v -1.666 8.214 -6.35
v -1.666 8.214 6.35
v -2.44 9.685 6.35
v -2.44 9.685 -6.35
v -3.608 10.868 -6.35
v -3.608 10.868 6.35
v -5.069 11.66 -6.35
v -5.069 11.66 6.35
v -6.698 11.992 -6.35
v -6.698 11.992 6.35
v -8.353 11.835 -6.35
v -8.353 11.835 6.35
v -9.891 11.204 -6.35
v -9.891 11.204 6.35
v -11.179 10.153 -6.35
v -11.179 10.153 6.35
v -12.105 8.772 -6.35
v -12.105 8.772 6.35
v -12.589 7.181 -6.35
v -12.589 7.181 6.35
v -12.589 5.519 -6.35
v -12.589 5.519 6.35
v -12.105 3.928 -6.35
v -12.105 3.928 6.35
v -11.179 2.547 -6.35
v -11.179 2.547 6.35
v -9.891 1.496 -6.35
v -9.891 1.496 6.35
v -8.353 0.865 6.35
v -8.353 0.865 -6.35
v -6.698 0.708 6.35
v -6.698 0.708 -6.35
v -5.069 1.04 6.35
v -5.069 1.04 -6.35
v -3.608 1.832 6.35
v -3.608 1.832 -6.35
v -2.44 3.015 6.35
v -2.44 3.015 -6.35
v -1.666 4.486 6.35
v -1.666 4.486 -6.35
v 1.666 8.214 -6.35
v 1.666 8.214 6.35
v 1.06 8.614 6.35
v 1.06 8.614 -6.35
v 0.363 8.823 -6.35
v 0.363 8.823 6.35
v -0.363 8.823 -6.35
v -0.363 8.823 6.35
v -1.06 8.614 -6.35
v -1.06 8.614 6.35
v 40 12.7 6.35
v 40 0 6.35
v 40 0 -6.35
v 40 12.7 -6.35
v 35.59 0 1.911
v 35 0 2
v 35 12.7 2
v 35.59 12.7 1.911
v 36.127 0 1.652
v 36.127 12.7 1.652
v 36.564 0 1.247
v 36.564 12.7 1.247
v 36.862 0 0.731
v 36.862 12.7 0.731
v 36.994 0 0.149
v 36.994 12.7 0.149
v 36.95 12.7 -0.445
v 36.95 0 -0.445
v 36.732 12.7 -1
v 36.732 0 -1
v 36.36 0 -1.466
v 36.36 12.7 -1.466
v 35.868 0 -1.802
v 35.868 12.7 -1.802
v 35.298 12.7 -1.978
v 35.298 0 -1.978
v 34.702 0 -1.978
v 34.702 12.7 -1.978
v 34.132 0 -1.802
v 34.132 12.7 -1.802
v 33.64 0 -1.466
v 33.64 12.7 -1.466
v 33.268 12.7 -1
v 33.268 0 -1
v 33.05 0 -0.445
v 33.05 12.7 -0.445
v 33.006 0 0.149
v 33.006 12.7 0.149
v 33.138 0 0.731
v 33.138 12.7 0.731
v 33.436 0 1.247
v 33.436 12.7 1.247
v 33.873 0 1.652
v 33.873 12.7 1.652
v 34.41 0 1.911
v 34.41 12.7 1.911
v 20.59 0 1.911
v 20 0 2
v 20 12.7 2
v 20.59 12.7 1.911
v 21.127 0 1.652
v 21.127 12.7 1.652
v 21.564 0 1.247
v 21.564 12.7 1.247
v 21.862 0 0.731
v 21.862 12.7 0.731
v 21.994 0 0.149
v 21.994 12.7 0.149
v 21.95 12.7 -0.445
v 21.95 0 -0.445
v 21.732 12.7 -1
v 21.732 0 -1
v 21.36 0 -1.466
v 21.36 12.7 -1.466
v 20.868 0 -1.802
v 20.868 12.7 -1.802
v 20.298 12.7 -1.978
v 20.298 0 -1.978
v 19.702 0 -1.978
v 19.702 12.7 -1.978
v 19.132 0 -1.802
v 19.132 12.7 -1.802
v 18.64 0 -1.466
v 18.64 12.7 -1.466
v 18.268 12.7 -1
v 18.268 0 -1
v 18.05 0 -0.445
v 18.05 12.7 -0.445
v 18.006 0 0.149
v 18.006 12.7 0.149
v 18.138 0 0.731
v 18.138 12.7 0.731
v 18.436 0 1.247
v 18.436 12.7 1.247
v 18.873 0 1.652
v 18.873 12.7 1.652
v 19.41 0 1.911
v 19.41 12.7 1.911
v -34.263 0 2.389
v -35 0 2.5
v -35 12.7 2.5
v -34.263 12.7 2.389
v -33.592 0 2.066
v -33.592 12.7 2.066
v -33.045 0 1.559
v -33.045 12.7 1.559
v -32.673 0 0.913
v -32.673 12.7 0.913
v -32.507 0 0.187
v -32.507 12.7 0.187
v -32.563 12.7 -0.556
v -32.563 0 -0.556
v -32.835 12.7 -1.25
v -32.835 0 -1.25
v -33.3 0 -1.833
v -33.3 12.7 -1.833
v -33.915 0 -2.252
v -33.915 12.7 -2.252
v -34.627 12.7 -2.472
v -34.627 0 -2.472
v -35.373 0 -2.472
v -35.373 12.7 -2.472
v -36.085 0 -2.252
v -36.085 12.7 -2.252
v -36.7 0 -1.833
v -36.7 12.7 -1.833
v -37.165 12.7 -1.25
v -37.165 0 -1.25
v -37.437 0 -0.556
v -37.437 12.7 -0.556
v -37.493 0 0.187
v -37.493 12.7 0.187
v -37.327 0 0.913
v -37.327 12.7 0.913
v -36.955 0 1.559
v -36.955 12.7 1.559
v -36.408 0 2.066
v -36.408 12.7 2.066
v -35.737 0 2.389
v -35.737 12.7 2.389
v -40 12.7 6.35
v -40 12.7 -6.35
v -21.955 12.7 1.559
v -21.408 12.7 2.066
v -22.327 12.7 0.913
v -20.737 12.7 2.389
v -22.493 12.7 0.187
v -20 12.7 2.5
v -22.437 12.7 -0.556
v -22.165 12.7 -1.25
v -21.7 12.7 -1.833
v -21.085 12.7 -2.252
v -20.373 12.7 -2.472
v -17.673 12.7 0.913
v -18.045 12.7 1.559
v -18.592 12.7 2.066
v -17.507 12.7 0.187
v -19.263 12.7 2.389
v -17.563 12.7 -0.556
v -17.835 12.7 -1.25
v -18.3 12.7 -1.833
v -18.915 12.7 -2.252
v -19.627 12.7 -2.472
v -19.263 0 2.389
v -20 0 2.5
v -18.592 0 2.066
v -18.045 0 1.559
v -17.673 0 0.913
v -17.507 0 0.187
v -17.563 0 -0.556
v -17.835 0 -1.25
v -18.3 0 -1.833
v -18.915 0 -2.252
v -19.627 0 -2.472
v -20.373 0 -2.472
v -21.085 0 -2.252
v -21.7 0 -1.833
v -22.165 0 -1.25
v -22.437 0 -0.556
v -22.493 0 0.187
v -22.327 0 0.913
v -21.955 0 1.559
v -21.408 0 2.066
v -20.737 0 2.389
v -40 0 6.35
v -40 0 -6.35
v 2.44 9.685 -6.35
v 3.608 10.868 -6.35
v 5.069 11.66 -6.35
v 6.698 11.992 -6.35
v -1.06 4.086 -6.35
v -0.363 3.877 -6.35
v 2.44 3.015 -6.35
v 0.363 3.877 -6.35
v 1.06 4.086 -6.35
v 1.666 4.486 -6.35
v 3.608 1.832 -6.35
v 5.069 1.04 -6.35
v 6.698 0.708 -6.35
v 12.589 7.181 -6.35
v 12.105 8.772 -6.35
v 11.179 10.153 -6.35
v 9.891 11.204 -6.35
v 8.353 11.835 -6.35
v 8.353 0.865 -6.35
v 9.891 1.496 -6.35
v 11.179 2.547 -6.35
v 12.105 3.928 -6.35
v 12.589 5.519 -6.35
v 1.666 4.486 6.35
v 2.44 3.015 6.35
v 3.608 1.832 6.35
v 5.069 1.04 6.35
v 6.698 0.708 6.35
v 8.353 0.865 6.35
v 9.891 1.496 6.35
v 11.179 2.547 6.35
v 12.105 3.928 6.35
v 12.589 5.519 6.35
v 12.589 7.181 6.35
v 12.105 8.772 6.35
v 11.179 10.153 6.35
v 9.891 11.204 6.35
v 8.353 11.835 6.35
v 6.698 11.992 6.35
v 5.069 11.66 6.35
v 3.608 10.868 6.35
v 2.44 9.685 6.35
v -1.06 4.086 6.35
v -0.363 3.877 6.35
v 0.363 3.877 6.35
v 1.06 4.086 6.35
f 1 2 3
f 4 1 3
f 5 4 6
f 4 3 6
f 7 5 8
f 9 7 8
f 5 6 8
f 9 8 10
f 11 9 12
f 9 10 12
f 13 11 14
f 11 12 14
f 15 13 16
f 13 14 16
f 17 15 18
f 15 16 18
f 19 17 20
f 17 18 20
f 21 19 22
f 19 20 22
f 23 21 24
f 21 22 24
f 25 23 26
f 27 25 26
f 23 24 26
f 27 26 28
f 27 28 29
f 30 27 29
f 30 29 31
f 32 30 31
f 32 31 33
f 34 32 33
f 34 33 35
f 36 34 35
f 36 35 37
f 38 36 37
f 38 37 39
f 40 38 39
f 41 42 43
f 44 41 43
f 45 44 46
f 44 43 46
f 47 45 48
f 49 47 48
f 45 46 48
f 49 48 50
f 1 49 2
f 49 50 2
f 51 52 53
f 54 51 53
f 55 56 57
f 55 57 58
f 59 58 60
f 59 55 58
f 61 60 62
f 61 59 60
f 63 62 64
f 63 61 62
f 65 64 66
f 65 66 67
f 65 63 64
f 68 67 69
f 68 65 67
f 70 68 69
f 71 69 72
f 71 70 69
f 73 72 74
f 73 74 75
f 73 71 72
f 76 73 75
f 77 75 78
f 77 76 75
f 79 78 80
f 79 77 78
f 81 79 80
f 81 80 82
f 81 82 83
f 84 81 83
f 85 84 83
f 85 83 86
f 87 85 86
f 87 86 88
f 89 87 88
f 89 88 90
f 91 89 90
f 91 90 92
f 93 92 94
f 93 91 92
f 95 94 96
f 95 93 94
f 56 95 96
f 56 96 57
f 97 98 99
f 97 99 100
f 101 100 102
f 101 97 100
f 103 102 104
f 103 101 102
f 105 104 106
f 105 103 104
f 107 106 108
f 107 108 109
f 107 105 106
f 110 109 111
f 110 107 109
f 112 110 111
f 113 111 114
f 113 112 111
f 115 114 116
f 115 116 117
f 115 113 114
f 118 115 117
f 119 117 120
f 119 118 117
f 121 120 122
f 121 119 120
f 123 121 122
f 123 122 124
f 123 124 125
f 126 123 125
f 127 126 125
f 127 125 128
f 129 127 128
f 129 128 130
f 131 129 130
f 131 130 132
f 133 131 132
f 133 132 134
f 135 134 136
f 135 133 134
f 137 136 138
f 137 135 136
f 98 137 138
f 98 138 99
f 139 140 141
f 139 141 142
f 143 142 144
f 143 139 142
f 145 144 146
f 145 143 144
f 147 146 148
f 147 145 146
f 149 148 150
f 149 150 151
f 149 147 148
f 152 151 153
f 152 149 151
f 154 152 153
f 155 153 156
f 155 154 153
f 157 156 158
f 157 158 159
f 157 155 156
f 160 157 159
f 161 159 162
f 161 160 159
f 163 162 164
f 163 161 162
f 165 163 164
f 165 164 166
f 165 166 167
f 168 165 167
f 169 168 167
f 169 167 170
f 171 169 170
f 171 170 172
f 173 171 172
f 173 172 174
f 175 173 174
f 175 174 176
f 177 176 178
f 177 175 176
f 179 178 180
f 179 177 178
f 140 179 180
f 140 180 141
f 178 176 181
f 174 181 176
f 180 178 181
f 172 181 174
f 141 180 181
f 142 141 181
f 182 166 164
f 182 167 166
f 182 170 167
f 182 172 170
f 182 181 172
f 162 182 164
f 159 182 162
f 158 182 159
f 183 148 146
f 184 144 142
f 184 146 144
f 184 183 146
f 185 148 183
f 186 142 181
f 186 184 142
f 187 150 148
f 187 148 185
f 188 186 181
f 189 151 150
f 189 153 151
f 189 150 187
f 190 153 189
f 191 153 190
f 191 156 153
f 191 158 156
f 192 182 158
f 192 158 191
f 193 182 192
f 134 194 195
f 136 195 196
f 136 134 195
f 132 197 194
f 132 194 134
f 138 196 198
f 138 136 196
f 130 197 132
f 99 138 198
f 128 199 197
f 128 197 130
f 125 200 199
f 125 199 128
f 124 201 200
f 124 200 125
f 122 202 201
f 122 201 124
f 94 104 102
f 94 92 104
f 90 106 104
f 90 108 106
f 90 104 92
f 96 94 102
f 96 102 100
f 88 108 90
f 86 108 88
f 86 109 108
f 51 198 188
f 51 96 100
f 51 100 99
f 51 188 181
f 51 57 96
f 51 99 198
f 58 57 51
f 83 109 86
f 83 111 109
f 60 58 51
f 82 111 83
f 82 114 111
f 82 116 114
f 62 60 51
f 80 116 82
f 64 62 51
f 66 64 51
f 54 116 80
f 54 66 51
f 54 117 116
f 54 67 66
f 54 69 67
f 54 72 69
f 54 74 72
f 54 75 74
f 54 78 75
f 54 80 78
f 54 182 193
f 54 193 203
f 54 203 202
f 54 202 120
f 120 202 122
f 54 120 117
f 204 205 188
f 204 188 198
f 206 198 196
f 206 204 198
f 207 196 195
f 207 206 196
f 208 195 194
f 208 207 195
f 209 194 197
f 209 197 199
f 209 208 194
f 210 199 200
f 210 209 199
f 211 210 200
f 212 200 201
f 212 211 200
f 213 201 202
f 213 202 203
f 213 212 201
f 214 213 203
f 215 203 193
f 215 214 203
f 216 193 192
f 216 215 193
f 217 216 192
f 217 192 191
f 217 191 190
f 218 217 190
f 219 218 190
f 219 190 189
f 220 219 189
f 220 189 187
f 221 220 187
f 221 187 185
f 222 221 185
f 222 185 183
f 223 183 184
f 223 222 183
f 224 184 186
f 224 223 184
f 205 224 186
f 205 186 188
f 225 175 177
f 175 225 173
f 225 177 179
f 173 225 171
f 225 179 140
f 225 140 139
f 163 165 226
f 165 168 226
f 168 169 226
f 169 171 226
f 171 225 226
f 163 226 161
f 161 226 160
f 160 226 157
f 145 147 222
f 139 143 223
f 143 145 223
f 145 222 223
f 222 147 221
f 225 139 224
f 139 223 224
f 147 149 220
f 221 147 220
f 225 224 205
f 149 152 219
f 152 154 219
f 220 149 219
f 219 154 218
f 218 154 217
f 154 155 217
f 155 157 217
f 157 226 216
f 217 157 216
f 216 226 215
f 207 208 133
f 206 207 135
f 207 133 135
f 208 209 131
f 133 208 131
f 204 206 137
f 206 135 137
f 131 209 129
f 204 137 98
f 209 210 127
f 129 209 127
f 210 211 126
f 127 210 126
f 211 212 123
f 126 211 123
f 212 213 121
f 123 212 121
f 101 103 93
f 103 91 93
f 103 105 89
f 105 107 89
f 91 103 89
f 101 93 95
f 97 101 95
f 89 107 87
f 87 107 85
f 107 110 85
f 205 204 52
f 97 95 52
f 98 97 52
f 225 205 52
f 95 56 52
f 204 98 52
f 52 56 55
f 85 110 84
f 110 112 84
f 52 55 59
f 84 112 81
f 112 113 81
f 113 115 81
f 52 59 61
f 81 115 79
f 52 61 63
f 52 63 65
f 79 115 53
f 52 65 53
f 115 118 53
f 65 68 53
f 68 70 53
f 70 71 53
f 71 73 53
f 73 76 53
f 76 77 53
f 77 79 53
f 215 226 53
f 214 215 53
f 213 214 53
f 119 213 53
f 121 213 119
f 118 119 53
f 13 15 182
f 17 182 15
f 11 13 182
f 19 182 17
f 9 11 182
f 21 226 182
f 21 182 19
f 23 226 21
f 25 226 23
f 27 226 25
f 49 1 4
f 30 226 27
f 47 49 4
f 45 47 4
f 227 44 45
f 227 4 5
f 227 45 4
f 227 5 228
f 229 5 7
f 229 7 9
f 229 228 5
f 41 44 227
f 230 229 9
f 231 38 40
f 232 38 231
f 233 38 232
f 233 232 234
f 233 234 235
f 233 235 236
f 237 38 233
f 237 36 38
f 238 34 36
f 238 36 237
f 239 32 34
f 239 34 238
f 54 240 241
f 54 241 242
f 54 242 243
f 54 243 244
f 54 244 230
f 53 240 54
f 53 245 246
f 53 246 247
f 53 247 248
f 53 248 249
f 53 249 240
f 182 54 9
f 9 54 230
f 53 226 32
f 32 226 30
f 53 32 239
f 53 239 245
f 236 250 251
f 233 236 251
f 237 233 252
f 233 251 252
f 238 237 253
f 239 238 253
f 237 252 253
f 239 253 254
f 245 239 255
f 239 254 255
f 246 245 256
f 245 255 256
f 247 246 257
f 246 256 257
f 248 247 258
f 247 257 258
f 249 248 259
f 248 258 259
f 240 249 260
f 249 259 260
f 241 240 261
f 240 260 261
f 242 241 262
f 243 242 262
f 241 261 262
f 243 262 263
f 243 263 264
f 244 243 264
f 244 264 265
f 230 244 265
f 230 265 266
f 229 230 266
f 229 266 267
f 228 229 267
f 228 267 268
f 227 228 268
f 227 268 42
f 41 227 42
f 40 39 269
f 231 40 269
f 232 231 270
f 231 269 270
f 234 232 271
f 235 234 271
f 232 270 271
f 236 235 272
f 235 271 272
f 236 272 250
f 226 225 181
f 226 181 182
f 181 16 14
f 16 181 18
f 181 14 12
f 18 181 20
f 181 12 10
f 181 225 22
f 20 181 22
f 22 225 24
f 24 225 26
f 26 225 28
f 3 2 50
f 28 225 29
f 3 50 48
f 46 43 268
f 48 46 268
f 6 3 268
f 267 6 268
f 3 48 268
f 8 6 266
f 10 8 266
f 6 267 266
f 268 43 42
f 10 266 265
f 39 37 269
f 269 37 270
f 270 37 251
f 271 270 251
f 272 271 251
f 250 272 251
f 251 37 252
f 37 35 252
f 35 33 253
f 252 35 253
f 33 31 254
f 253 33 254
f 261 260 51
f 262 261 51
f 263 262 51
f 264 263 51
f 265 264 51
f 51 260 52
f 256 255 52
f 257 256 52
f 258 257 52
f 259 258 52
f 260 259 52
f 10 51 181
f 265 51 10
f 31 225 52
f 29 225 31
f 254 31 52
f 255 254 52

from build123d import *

# Parameters (mm, degrees)
SKETCH1_W           = 80
SKETCH1_H           = 12.7
SKETCH1_R           = 2.5
SKETCH1_R_2         = 2
BOSS_EXTRUDE1_DEPTH = 12.7
CUT_EXTRUDE1_DEPTH  = 44.847234804


with BuildPart() as part:
    # Sketch1 → Boss-Extrude1 (new body)
    with BuildSketch(Plane(origin=(0, 0, 0), x_dir=(1, 0, 0), z_dir=(0, 1, 0))):
        Rectangle(SKETCH1_W, SKETCH1_H)
        with Locations(Location((-35, 0, 0), (0, 0, 270))):
            Circle(SKETCH1_R, mode=Mode.SUBTRACT)
        with Locations(Location((-20, 0, 0), (0, 0, 270))):
            Circle(SKETCH1_R, mode=Mode.SUBTRACT)
        with Locations(Location((20, 0, 0), (0, 0, 270))):
            Circle(SKETCH1_R_2, mode=Mode.SUBTRACT)
        with Locations(Location((35, 0, 0), (0, 0, 270))):
            Circle(SKETCH1_R_2, mode=Mode.SUBTRACT)
    extrude(amount=BOSS_EXTRUDE1_DEPTH)

    # Sketch2 → Cut-Extrude1 (cut, through all)
    with BuildSketch(Plane.XY.offset(6.35)):
        with BuildLine():
            ThreePointArc((-1.66625, 8.213762575), (-12.65, 6.35), (-1.66625, 4.486237425))
            ThreePointArc((-1.66625, 4.486237425), (0, 3.85), (1.66625, 4.486237425))
            ThreePointArc((1.66625, 4.486237425), (12.65, 6.35), (1.66625, 8.213762575))
            ThreePointArc((1.66625, 8.213762575), (0, 8.85), (-1.66625, 8.213762575))
        make_face()
    extrude(amount=-CUT_EXTRUDE1_DEPTH, mode=Mode.SUBTRACT)


solid = part.part
